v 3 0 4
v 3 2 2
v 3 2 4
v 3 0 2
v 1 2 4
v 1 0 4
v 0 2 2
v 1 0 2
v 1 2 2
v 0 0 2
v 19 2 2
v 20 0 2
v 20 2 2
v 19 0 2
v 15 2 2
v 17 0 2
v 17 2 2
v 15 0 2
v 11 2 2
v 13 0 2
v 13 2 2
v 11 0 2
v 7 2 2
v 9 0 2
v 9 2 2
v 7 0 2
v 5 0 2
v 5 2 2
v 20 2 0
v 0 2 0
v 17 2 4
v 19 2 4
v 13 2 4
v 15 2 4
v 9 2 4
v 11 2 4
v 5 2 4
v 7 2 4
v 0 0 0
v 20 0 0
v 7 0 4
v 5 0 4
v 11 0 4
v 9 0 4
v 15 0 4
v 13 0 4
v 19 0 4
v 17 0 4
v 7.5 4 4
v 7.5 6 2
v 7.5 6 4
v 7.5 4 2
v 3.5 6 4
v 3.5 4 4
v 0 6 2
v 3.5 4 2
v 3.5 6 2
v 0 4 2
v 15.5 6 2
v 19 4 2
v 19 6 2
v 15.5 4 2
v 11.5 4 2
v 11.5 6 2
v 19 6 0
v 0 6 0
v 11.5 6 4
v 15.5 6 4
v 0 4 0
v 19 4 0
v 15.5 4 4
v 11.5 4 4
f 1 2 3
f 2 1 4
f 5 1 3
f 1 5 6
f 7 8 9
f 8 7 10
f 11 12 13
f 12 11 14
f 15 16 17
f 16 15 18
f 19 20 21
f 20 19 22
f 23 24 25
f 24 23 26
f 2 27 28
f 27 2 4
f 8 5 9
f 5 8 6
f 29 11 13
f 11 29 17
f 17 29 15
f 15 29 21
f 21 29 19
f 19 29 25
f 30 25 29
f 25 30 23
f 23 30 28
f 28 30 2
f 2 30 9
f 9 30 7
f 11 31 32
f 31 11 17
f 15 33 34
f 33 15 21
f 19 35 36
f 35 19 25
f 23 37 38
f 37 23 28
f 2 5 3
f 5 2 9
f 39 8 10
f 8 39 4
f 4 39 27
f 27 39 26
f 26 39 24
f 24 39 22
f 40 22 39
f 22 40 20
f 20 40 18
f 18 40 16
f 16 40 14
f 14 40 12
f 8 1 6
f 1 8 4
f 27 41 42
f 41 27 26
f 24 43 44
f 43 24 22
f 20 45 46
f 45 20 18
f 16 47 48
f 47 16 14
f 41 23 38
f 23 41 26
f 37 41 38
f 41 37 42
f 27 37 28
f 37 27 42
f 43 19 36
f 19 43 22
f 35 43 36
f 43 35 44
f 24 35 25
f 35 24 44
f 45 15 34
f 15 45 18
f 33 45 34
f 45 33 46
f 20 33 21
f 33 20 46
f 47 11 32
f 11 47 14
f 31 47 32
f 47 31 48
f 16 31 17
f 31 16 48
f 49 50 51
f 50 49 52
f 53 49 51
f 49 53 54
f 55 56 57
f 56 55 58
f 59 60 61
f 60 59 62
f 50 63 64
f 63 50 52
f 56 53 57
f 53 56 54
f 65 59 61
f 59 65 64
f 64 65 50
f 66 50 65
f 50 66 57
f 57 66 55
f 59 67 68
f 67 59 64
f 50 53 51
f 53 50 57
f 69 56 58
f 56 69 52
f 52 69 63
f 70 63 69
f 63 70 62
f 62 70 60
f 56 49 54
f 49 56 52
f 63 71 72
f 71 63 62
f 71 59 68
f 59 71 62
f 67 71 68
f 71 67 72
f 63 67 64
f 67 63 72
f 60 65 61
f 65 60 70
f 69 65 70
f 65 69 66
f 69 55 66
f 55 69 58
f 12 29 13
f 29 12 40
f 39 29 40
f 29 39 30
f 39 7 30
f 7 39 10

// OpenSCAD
// file: utility.scad
/*This library, part of UtilitySCAD, is placed into the public domain by NMR_Scientist.

Version: R1
Title: UtilitySCAD
Description: Miscellaneous utility modules I developed over the course of several projects to reuse common operations that were seen over various models.

History:
* ??/??/2024 - R1 - First release to be with a model whenever it is released.
*/

$fa = 1;
$fs = 0.1;

use <MCAD/regular_shapes.scad>;

//Move objects in the x-axis.
module move_x (x)
{
    translate([x,0,0])
    {
        children();
    }
}

//Move objects in the y-axis
module move_y (y)
{
    translate([0,y,0])
    {
        children();
    }
}

//Move objects in the z-ax
module move_z (z)
{
    translate([0,0,z])
    {
        children();
    }
}

//Move objects by a given point in all direction. -1 would means moving to the left, moving back, and moving down by one point.
module move_by(point)
{
    translate([point,point,point])
    {
        children();
    }
}

//Exactly like move_by, but a negation. Named for its very common use in adding tolerance to objects.
module move_by_margin(m)
{
    move_by(-m)
    {
        children();
    }
}

//A cylinder rotated to its side.
module hor_cylinder(width,r,r)
{
    move_y(r)
        move_z(r)
            rotate([0,90,0])
            {
                cylinder(width,r,r);
            }
}

module hor_cylinder_y(length,r)
{
    translate([r * 2,0,0])
    {
        rotate([0,0,90])
        {
            hor_cylinder(length,r);
        }
    }
}


//Cut a object at a given height and then move that object down, usually to zero if the object was placed at zero height.
module hor_cut(width,length,height)
{
    translate([0,0,-height])
    {
        difference()
        {
            children();
            translate([-1,-1,-1])
            {
                cube([width + 2,length + 2,height + 1]);
            }
        }
    }
}

function bevel_radius(length) = length * 2 / 3;
function bevel_height(r) = r * sqrt(3)/2;

//Bevel at 45 degree slop up, facing, back, then extrude upward by height.
module bevel_up_back_45(width,length,height)
{
    r = bevel_radius(length);
    z = bevel_height(r);
    m = 0.1;
    m_2 = m * 2;
    difference()
    {
        translate([0,r / 2,z])
        {
            rotate([0,90,0])
            {
                triangle_prism(width,r);
            }
        }
        // Cut off to the required height.
        move_x(-m)
            move_y(-m)
                move_z(height)
                   cube([width + m,length + m,z * 2 - height]);
    }
    //If cutting off isn't happening simply add height.
    if (height >= z)
    {
        move_z(z)
        {
            cube([width,length,height - z]);
        }
    }
}

//Center an object against a particular width of another object.
module center(centering_w,target_w)
{
    x = (target_w - centering_w) / 2;
    translate([x,0,0])
    {
        children();
    }
}

//Move object to a certain value of x, but also account for the object size, such that the object is place before the point x. For a postive value of x, that is before the x, for a negative value of x, that is next to x. Useful for dimensional accurate placement.
module move_object_x(x,r)
{
    diameter = r * 2;
    if (abs(x) < diameter)
    {
        echo("Cannot move!");
    }
    else
    {
        if (x > 0)
        {
            move_x(x - diameter)
            {
                children();
            }
        }
        else if (x < 0)
        {
            move_x(x + diameter)
                children();
        }
    }
}


//Move object to a certain value of z, but also account for the object size, such that the object is place before the point z. For a postive value of z, that is below of z, for a negative value of z, that is above z. Useful for dimensional accurate placement.
module move_object_z(z, r)
{
    diameter = r * 2;
    if (abs(z) < diameter)
    {
        echo("Cannot move!");
    }
    else
    {
        if (z > 0)
        {
            move_z(z - diameter)
            {
                children();
            }
        }
        else if (z < 0)
        {
            move_z(z + diameter)
                children();
        }
    }
}


//Generaate all notches in a castellation at the same time, and space each notch for the length of the notch.
module notches(n, multipler)
{
    for (x = [1:n])
    {
        final_x = (x - 1) * multipler;
        move_x(final_x)
        {
            if ((x - 1) % 2 == 0)
            {
               children();
            }
        }
    }
}

//Get the total width of the Castellation, starting with the first and last notches.
function CastellateTotalW(w,size) = (w - 1) % 2 == 1 ? (w - 1) * size.x : w * size.x;


//Center the resulting castellation of a certain cuboid size.
module castellate(width,size, m = 0)
{
    total_notches = floor(width / size.x);
    total_w = CastellateTotalW(total_notches,size);
    center(total_w,width)
    {
        notches(total_notches,size.x)
        {
            move_x(m)
            {
                shrink = [size.x - (m * 2),size.y,size.z];
                cube(shrink);
            }
        }
    }

}
// main file
/* Public domain, for your own use. */
use <utility.scad>;

cube2 = [2,2,2];
d = 20;
cube([d,2,2]);
move_z(2)
    castellate(d,cube2);

move_y(4)
{
    cube3 = [4,2,2];
    d = 19;
    cube([d,2,2]);
    move_z(2)
    castellate(d,cube3);
}
